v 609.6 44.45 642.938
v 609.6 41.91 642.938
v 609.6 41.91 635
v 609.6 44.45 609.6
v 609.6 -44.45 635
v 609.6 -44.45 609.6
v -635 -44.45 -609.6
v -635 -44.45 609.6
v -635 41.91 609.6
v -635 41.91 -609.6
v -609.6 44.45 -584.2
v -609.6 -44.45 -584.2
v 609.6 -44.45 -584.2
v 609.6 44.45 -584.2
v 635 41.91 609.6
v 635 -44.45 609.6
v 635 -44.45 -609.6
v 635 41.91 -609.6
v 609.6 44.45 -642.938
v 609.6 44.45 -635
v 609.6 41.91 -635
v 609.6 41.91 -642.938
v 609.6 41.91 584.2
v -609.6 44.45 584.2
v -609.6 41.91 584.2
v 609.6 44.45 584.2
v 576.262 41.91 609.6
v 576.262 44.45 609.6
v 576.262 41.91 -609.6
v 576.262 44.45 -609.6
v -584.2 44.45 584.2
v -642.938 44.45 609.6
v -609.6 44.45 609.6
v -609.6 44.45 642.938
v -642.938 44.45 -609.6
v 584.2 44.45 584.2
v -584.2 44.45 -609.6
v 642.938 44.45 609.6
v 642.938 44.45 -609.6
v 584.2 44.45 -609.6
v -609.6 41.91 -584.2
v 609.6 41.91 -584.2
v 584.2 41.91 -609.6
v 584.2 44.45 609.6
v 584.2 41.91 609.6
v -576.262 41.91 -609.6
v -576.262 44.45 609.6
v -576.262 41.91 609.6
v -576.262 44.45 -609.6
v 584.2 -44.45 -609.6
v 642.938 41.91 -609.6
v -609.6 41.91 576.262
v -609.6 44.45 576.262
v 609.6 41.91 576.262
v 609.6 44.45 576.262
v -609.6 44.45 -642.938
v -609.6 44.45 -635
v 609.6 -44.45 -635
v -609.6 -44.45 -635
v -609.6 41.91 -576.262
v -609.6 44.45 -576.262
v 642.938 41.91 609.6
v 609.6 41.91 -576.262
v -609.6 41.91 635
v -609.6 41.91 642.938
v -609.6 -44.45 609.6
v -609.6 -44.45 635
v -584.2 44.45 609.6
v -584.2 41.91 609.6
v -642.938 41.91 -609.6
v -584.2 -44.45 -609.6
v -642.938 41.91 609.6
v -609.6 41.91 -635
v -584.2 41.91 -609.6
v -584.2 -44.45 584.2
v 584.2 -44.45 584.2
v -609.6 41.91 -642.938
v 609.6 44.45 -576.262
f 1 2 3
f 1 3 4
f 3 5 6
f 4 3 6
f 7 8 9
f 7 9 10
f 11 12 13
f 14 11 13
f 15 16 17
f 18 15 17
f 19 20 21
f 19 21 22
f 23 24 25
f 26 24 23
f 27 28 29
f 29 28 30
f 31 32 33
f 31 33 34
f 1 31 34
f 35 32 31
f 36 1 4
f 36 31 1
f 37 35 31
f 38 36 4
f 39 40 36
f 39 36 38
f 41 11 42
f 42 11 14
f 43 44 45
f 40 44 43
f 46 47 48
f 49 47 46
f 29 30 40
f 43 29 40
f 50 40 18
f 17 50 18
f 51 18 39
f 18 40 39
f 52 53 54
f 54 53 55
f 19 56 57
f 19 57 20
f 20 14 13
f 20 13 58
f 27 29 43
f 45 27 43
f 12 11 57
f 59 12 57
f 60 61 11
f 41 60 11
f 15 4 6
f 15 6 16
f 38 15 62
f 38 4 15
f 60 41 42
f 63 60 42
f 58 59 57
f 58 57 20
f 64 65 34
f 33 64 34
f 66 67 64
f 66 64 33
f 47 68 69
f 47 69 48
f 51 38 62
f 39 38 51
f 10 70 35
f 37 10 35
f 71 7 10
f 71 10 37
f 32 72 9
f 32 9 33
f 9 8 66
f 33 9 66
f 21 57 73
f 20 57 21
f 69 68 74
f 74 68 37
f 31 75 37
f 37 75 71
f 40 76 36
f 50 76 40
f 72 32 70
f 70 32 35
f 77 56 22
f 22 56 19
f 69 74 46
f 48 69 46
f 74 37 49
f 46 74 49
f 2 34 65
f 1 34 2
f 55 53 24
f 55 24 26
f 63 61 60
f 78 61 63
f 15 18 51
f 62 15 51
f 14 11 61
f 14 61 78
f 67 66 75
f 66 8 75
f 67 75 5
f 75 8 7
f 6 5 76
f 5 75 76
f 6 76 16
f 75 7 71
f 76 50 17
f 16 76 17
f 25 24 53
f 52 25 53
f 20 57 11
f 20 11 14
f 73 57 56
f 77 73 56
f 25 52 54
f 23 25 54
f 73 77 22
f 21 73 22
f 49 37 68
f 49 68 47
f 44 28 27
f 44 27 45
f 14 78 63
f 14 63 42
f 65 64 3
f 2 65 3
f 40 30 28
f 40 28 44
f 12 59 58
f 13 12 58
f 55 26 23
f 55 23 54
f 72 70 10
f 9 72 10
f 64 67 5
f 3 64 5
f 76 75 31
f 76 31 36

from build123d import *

# Parameters (mm, degrees)
FIXTURE_START       = -44.45
FIXTURE_OUTLINE_W   = 1219.2
FIXTURE_OUTLINE_H   = 50.8
FIXTURE_DEPTH       = 88.9
FIXTURE_2_OUTLINE_W = 50.8
FIXTURE_2_OUTLINE_H = 1219.2
FIXTURE_2_DEPTH     = 88.9
FIXTURE_3_OUTLINE_W = 50.8
FIXTURE_3_OUTLINE_H = 1219.2
FIXTURE_3_DEPTH     = 88.9
FIXTURE_4_OUTLINE_W = 1219.2
FIXTURE_4_OUTLINE_H = 50.8
FIXTURE_4_DEPTH     = 88.9
OUTERFLANGE_START   = 44.45
SKETCH13_W          = 7.9375
SKETCH13_H          = 1219.2
SKETCH13_W_2        = 1219.2
SKETCH13_H_2        = 7.9375
OUTERFLANGE_DEPTH   = 2.54
INNERFLANGE_START   = 44.45
SKETCH14_W          = 7.9375
SKETCH14_H          = 1219.2
INNERFLANGE_DEPTH   = 2.54
SKETCH14_W_2        = 1219.2
SKETCH14_H_2        = 7.9375
INNERFLANGE_2_DEPTH = 2.54
INNERFLANGE_3_DEPTH = 2.54
INNERFLANGE_4_DEPTH = 2.54


with BuildPart() as part:
    # Fixture: read off the stored shape, not the designer's step
    # Fixture outline → Fixture (new body)
    with BuildSketch(Plane(origin=(0, 0, 0), x_dir=(1, 0, 0), z_dir=(0, 1, 0)).offset(FIXTURE_START)):
        with Locations((0, 609.6)):
            Rectangle(FIXTURE_OUTLINE_W, FIXTURE_OUTLINE_H)
    extrude(amount=FIXTURE_DEPTH)


with BuildPart() as body_2:
    # Fixture 2 outline → Fixture 2 (new body)
    with BuildSketch(Plane(origin=(0, 0, 0), x_dir=(1, 0, 0), z_dir=(0, 1, 0)).offset(FIXTURE_START)):
        with Locations((609.6, 0)):
            Rectangle(FIXTURE_2_OUTLINE_W, FIXTURE_2_OUTLINE_H)
    extrude(amount=FIXTURE_2_DEPTH)



with BuildPart() as body_3:
    # Fixture 3 outline → Fixture 3 (new body)
    with BuildSketch(Plane(origin=(0, 0, 0), x_dir=(1, 0, 0), z_dir=(0, 1, 0)).offset(FIXTURE_START)):
        with Locations((-609.6, 0)):
            Rectangle(FIXTURE_3_OUTLINE_W, FIXTURE_3_OUTLINE_H)
    extrude(amount=FIXTURE_3_DEPTH)


with BuildPart() as body_4:
    # Fixture 4 outline → Fixture 4 (new body)
    with BuildSketch(Plane(origin=(0, 0, 0), x_dir=(1, 0, 0), z_dir=(0, 1, 0)).offset(FIXTURE_START)):
        with Locations((0, -609.6)):
            Rectangle(FIXTURE_4_OUTLINE_W, FIXTURE_4_OUTLINE_H)
    extrude(amount=FIXTURE_4_DEPTH)


with BuildPart() as body_2_1:
    add(body_2.part)

    add(body_3.part)  # OuterFlange merges body 3

    add(body_4.part)  # OuterFlange merges body 4
    # Sketch13 → OuterFlange (add)
    with BuildSketch(Plane(origin=(0, 0, 0), x_dir=(1, 0, 0), z_dir=(0, 1, 0)).offset(OUTERFLANGE_START)):
        with Locations((638.96875, 0)):
            Rectangle(SKETCH13_W, SKETCH13_H)
        with Locations((0, -638.96875)):
            Rectangle(SKETCH13_W_2, SKETCH13_H_2)
        with Locations((-638.96875, 0)):
            Rectangle(SKETCH13_W, SKETCH13_H)
        with Locations((0, 638.96875)):
            Rectangle(SKETCH13_W_2, SKETCH13_H_2)
    extrude(amount=-OUTERFLANGE_DEPTH)


with BuildPart() as body_3_2:
    # Sketch14 → InnerFlange (new body)
    with BuildSketch(Plane(origin=(0, 0, 0), x_dir=(1, 0, 0), z_dir=(0, 1, 0)).offset(INNERFLANGE_START)):
        with Locations((580.23125, 0)):
            Rectangle(SKETCH14_W, SKETCH14_H)
    extrude(amount=-INNERFLANGE_DEPTH)


with BuildPart() as body_4_2:
    # Sketch14 → InnerFlange 2 (new body)
    with BuildSketch(Plane(origin=(0, 0, 0), x_dir=(1, 0, 0), z_dir=(0, 1, 0)).offset(INNERFLANGE_START)):
        with Locations((0, -580.23125)):
            Rectangle(SKETCH14_W_2, SKETCH14_H_2)
    extrude(amount=-INNERFLANGE_2_DEPTH)


with BuildPart() as body_5:
    # Sketch14 → InnerFlange 3 (new body)
    with BuildSketch(Plane(origin=(0, 0, 0), x_dir=(1, 0, 0), z_dir=(0, 1, 0)).offset(INNERFLANGE_START)):
        with Locations((-580.23125, 0)):
            Rectangle(SKETCH14_W, SKETCH14_H)
    extrude(amount=-INNERFLANGE_3_DEPTH)


with BuildPart() as body_6:
    # Sketch14 → InnerFlange 4 (new body)
    with BuildSketch(Plane(origin=(0, 0, 0), x_dir=(1, 0, 0), z_dir=(0, 1, 0)).offset(INNERFLANGE_START)):
        with Locations((0, 580.23125)):
            Rectangle(SKETCH14_W_2, SKETCH14_H_2)
    extrude(amount=-INNERFLANGE_4_DEPTH)


solid = Compound([part.part, body_2_1.part, body_3_2.part, body_4_2.part, body_5.part, body_6.part])
